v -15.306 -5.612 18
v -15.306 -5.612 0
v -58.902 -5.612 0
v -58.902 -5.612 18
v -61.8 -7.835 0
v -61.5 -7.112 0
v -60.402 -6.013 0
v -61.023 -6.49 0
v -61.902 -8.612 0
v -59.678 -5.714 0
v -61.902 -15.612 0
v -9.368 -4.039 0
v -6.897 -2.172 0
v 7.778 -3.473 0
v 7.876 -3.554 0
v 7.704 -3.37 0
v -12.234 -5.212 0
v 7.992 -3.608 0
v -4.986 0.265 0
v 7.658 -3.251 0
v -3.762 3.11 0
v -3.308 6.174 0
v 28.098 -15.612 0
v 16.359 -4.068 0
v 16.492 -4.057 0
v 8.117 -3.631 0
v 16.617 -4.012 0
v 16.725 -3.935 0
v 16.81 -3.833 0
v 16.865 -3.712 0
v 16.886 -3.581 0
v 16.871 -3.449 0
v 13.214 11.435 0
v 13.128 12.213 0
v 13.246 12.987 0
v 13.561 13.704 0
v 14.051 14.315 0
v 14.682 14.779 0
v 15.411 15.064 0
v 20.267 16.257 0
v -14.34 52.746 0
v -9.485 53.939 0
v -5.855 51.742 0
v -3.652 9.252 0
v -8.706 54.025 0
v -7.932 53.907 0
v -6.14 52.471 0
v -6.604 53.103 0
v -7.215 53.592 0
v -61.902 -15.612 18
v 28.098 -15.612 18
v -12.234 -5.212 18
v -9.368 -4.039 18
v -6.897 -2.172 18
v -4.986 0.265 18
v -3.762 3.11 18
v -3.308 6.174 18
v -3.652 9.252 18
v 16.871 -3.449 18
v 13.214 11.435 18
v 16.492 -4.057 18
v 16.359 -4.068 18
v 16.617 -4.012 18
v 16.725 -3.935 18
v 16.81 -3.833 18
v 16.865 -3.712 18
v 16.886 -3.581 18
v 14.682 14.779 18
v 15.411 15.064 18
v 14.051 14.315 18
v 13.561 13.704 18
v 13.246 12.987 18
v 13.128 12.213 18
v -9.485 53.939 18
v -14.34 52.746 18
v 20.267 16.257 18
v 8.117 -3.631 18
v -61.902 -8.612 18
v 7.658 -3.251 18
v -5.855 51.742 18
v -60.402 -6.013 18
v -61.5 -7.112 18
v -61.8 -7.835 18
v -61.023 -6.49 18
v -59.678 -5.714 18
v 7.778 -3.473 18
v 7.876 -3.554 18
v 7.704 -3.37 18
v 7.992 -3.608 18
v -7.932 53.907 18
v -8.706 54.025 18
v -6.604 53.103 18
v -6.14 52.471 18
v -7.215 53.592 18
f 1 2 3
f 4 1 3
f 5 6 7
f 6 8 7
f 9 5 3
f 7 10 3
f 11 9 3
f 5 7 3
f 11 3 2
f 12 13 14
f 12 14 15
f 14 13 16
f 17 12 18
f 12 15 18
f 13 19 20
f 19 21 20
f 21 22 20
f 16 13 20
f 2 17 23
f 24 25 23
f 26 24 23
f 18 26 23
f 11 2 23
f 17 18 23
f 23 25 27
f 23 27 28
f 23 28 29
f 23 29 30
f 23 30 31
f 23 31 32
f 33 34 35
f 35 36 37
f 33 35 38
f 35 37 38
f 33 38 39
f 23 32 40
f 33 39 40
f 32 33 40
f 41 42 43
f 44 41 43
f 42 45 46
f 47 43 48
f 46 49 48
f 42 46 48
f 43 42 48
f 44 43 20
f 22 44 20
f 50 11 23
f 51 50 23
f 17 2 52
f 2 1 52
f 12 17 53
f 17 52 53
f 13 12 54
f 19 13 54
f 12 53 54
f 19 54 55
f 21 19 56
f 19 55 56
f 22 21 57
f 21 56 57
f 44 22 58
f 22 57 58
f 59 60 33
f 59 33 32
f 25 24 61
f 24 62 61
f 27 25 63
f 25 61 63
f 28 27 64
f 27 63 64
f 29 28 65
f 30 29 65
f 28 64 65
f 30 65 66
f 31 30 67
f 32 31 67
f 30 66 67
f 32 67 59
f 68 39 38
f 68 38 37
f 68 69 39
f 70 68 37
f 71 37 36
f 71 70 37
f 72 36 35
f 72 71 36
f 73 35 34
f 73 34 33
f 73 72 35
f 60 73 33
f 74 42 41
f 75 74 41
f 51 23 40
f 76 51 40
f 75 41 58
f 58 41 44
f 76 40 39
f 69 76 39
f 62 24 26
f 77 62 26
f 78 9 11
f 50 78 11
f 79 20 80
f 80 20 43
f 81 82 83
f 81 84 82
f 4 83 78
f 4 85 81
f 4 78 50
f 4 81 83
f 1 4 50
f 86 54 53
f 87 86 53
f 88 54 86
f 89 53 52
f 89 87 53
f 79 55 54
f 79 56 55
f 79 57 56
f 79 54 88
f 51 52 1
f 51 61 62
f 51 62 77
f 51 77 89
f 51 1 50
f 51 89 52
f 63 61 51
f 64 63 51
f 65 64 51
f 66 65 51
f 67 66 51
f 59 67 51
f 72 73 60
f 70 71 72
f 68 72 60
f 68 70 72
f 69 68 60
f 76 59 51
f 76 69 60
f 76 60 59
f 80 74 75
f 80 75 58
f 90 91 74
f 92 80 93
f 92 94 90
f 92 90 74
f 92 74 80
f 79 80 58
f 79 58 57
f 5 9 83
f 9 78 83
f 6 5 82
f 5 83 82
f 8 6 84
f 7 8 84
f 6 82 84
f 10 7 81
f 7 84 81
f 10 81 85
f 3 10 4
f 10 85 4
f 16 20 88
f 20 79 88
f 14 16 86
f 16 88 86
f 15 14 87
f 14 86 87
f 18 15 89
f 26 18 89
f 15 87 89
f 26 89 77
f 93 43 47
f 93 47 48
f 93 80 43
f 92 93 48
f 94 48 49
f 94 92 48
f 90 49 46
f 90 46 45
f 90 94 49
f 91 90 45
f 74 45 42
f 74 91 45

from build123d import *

# Parameters (mm, degrees)
F1_DEPTH = 18
F2_R     = 3
F3_R     = 3
F4_R     = 12
F5_R     = 0.5


with BuildPart() as f1:
    # F0 (on Top) → F1 (new body)
    with BuildSketch(Plane.XY):
        Polygon((-61.901969, -15.611527), (28.098031, -15.611527), (20.267047, 16.256898), (12.498162, 14.347861), (17.032125, -4.103242), (7.746533, -3.611527), (-6.571248, 54.655111), (-14.340133, 52.746074), (0, -5.611527), (-61.901969, -5.611527), align=None)
    extrude(amount=F1_DEPTH)

    # F2
    f2_edges = [f1.edges().sort_by_distance(p)[0] for p in [
        (12.498162, 14.347861, 9),
        (-6.571248, 54.655111, 9),
    ]]
    fillet(f2_edges, radius=F2_R)

    # F3
    f3_edges = [f1.edges().sort_by_distance(p)[0] for p in [
        (-61.901969, -5.611527, 9),
    ]]
    fillet(f3_edges, radius=F3_R)

    # F4
    f4_edges = [f1.edges().sort_by_distance(p)[0] for p in [
        (0, -5.611527, 9),
    ]]
    fillet(f4_edges, radius=F4_R)

    # F5
    f5_edges = [f1.edges().sort_by_distance(p)[0] for p in [
        (17.032125, -4.103242, 9),
        (7.746533, -3.611527, 9),
    ]]
    fillet(f5_edges, radius=F5_R)


solid = f1.part
